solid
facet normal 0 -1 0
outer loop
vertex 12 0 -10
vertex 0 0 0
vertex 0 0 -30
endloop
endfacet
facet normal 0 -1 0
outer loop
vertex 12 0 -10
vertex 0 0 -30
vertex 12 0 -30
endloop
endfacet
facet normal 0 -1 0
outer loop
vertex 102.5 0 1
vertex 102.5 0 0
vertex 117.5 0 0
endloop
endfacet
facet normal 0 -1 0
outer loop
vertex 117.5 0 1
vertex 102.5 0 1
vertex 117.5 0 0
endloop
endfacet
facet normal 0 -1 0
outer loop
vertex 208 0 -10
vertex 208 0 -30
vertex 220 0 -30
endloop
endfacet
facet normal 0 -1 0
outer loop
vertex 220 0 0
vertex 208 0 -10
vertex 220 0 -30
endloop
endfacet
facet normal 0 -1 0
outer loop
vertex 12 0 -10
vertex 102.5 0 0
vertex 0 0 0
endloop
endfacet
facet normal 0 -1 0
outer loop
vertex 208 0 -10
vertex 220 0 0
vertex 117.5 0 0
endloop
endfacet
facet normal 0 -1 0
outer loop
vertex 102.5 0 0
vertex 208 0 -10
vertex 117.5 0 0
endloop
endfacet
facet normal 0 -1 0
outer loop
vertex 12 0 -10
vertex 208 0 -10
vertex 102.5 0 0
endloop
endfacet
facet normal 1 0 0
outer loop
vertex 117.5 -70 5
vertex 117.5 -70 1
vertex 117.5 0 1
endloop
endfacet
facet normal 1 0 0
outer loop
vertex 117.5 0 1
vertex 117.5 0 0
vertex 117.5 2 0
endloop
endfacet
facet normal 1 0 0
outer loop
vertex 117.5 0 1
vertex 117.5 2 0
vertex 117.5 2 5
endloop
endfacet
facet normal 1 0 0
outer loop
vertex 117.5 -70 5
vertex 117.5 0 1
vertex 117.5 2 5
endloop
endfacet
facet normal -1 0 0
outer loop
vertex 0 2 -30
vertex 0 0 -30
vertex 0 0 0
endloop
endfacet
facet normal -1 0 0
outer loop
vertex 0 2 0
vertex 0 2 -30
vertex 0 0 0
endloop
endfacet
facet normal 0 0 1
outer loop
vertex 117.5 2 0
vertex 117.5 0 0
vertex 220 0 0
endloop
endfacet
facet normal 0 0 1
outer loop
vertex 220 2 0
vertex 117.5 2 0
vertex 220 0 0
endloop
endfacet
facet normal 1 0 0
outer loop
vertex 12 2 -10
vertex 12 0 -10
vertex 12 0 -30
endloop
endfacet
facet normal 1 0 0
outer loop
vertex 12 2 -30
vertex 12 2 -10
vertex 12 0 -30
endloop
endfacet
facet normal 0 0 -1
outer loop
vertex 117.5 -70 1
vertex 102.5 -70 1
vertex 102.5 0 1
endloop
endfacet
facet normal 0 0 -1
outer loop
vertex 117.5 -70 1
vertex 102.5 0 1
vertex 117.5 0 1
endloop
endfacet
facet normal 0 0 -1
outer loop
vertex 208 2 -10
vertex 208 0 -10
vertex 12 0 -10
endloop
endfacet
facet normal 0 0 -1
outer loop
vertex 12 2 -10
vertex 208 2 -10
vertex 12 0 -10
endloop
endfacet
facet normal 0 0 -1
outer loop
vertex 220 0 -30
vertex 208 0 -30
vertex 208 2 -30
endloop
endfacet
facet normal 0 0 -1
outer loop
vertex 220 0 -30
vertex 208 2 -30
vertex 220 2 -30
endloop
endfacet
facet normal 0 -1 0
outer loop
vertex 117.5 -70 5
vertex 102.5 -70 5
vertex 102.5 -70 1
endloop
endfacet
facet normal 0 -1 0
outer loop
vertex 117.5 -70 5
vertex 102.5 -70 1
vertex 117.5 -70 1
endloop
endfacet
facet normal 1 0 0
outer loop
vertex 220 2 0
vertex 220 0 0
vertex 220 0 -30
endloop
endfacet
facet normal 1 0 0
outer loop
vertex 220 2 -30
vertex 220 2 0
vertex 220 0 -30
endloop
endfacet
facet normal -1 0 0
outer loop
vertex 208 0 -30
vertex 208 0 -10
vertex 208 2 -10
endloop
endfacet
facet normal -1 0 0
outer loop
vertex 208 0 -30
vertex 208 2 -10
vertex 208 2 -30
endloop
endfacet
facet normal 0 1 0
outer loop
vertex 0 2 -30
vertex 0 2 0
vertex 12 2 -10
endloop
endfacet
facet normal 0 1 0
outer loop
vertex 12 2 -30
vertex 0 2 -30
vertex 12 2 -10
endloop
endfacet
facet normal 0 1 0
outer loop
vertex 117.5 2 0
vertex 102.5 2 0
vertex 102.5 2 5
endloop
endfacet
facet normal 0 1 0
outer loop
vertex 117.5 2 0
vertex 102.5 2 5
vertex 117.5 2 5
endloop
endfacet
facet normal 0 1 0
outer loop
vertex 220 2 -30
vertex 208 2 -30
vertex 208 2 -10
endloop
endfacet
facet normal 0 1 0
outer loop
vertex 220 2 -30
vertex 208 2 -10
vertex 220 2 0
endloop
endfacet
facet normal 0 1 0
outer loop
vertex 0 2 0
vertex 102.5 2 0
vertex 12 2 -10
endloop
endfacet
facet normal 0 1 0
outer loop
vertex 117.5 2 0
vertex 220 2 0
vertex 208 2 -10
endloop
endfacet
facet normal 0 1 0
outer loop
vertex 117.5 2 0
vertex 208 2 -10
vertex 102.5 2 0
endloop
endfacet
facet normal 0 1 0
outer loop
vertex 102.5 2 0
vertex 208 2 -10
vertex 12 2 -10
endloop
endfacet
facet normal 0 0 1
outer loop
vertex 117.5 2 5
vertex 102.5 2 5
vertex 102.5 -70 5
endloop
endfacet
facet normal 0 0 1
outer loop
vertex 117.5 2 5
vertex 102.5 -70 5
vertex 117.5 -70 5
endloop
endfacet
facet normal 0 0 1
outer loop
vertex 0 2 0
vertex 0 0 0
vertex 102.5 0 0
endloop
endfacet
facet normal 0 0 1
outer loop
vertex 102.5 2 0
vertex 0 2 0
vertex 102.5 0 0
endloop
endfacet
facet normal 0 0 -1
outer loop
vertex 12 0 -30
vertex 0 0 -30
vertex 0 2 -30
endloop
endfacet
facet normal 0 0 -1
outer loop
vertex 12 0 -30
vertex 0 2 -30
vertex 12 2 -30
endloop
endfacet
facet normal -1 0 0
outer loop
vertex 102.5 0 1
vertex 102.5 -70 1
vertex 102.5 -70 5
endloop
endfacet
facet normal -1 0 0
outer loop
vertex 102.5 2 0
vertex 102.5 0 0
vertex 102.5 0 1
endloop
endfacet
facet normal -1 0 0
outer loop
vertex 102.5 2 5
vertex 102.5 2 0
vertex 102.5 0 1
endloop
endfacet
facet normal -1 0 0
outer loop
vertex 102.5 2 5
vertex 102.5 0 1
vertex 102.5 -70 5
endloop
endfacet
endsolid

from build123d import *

# Parameters (mm, degrees)
SKETCH1_W           = 12
SKETCH1_H           = 20
BOSS_EXTRUDE1_DEPTH = 2
SKETCH2_W           = 15
SKETCH2_H           = 4
BOSS_EXTRUDE2_DEPTH = 70


with BuildPart() as part:
    # Sketch1 → Boss-Extrude1 (new body)
    with BuildSketch(Plane(origin=(0, 0, 0), x_dir=(1, 0, 0), z_dir=(0, 1, 0))):
        with Locations((6, 20)):
            Rectangle(SKETCH1_W, SKETCH1_H)
        Polygon((102.5, 0), (110, 0), (110, 10), (12, 10), (0, 10), (0, 0), align=None)
        Polygon((117.5, 0), (110, 0), (102.5, 0), (102.5, -5), (117.5, -5), align=None)
        Polygon((110, 10), (110, 0), (117.5, 0), (220, 0), (220, 10), (208, 10), align=None)
        with Locations((214, 20)):
            Rectangle(SKETCH1_W, SKETCH1_H)
    extrude(amount=BOSS_EXTRUDE1_DEPTH)

    # Sketch2 → Boss-Extrude2 (add)
    with BuildSketch(Plane.XZ):
        with Locations((110, 3)):
            Rectangle(SKETCH2_W, SKETCH2_H)
    extrude(amount=BOSS_EXTRUDE2_DEPTH)


solid = part.part
